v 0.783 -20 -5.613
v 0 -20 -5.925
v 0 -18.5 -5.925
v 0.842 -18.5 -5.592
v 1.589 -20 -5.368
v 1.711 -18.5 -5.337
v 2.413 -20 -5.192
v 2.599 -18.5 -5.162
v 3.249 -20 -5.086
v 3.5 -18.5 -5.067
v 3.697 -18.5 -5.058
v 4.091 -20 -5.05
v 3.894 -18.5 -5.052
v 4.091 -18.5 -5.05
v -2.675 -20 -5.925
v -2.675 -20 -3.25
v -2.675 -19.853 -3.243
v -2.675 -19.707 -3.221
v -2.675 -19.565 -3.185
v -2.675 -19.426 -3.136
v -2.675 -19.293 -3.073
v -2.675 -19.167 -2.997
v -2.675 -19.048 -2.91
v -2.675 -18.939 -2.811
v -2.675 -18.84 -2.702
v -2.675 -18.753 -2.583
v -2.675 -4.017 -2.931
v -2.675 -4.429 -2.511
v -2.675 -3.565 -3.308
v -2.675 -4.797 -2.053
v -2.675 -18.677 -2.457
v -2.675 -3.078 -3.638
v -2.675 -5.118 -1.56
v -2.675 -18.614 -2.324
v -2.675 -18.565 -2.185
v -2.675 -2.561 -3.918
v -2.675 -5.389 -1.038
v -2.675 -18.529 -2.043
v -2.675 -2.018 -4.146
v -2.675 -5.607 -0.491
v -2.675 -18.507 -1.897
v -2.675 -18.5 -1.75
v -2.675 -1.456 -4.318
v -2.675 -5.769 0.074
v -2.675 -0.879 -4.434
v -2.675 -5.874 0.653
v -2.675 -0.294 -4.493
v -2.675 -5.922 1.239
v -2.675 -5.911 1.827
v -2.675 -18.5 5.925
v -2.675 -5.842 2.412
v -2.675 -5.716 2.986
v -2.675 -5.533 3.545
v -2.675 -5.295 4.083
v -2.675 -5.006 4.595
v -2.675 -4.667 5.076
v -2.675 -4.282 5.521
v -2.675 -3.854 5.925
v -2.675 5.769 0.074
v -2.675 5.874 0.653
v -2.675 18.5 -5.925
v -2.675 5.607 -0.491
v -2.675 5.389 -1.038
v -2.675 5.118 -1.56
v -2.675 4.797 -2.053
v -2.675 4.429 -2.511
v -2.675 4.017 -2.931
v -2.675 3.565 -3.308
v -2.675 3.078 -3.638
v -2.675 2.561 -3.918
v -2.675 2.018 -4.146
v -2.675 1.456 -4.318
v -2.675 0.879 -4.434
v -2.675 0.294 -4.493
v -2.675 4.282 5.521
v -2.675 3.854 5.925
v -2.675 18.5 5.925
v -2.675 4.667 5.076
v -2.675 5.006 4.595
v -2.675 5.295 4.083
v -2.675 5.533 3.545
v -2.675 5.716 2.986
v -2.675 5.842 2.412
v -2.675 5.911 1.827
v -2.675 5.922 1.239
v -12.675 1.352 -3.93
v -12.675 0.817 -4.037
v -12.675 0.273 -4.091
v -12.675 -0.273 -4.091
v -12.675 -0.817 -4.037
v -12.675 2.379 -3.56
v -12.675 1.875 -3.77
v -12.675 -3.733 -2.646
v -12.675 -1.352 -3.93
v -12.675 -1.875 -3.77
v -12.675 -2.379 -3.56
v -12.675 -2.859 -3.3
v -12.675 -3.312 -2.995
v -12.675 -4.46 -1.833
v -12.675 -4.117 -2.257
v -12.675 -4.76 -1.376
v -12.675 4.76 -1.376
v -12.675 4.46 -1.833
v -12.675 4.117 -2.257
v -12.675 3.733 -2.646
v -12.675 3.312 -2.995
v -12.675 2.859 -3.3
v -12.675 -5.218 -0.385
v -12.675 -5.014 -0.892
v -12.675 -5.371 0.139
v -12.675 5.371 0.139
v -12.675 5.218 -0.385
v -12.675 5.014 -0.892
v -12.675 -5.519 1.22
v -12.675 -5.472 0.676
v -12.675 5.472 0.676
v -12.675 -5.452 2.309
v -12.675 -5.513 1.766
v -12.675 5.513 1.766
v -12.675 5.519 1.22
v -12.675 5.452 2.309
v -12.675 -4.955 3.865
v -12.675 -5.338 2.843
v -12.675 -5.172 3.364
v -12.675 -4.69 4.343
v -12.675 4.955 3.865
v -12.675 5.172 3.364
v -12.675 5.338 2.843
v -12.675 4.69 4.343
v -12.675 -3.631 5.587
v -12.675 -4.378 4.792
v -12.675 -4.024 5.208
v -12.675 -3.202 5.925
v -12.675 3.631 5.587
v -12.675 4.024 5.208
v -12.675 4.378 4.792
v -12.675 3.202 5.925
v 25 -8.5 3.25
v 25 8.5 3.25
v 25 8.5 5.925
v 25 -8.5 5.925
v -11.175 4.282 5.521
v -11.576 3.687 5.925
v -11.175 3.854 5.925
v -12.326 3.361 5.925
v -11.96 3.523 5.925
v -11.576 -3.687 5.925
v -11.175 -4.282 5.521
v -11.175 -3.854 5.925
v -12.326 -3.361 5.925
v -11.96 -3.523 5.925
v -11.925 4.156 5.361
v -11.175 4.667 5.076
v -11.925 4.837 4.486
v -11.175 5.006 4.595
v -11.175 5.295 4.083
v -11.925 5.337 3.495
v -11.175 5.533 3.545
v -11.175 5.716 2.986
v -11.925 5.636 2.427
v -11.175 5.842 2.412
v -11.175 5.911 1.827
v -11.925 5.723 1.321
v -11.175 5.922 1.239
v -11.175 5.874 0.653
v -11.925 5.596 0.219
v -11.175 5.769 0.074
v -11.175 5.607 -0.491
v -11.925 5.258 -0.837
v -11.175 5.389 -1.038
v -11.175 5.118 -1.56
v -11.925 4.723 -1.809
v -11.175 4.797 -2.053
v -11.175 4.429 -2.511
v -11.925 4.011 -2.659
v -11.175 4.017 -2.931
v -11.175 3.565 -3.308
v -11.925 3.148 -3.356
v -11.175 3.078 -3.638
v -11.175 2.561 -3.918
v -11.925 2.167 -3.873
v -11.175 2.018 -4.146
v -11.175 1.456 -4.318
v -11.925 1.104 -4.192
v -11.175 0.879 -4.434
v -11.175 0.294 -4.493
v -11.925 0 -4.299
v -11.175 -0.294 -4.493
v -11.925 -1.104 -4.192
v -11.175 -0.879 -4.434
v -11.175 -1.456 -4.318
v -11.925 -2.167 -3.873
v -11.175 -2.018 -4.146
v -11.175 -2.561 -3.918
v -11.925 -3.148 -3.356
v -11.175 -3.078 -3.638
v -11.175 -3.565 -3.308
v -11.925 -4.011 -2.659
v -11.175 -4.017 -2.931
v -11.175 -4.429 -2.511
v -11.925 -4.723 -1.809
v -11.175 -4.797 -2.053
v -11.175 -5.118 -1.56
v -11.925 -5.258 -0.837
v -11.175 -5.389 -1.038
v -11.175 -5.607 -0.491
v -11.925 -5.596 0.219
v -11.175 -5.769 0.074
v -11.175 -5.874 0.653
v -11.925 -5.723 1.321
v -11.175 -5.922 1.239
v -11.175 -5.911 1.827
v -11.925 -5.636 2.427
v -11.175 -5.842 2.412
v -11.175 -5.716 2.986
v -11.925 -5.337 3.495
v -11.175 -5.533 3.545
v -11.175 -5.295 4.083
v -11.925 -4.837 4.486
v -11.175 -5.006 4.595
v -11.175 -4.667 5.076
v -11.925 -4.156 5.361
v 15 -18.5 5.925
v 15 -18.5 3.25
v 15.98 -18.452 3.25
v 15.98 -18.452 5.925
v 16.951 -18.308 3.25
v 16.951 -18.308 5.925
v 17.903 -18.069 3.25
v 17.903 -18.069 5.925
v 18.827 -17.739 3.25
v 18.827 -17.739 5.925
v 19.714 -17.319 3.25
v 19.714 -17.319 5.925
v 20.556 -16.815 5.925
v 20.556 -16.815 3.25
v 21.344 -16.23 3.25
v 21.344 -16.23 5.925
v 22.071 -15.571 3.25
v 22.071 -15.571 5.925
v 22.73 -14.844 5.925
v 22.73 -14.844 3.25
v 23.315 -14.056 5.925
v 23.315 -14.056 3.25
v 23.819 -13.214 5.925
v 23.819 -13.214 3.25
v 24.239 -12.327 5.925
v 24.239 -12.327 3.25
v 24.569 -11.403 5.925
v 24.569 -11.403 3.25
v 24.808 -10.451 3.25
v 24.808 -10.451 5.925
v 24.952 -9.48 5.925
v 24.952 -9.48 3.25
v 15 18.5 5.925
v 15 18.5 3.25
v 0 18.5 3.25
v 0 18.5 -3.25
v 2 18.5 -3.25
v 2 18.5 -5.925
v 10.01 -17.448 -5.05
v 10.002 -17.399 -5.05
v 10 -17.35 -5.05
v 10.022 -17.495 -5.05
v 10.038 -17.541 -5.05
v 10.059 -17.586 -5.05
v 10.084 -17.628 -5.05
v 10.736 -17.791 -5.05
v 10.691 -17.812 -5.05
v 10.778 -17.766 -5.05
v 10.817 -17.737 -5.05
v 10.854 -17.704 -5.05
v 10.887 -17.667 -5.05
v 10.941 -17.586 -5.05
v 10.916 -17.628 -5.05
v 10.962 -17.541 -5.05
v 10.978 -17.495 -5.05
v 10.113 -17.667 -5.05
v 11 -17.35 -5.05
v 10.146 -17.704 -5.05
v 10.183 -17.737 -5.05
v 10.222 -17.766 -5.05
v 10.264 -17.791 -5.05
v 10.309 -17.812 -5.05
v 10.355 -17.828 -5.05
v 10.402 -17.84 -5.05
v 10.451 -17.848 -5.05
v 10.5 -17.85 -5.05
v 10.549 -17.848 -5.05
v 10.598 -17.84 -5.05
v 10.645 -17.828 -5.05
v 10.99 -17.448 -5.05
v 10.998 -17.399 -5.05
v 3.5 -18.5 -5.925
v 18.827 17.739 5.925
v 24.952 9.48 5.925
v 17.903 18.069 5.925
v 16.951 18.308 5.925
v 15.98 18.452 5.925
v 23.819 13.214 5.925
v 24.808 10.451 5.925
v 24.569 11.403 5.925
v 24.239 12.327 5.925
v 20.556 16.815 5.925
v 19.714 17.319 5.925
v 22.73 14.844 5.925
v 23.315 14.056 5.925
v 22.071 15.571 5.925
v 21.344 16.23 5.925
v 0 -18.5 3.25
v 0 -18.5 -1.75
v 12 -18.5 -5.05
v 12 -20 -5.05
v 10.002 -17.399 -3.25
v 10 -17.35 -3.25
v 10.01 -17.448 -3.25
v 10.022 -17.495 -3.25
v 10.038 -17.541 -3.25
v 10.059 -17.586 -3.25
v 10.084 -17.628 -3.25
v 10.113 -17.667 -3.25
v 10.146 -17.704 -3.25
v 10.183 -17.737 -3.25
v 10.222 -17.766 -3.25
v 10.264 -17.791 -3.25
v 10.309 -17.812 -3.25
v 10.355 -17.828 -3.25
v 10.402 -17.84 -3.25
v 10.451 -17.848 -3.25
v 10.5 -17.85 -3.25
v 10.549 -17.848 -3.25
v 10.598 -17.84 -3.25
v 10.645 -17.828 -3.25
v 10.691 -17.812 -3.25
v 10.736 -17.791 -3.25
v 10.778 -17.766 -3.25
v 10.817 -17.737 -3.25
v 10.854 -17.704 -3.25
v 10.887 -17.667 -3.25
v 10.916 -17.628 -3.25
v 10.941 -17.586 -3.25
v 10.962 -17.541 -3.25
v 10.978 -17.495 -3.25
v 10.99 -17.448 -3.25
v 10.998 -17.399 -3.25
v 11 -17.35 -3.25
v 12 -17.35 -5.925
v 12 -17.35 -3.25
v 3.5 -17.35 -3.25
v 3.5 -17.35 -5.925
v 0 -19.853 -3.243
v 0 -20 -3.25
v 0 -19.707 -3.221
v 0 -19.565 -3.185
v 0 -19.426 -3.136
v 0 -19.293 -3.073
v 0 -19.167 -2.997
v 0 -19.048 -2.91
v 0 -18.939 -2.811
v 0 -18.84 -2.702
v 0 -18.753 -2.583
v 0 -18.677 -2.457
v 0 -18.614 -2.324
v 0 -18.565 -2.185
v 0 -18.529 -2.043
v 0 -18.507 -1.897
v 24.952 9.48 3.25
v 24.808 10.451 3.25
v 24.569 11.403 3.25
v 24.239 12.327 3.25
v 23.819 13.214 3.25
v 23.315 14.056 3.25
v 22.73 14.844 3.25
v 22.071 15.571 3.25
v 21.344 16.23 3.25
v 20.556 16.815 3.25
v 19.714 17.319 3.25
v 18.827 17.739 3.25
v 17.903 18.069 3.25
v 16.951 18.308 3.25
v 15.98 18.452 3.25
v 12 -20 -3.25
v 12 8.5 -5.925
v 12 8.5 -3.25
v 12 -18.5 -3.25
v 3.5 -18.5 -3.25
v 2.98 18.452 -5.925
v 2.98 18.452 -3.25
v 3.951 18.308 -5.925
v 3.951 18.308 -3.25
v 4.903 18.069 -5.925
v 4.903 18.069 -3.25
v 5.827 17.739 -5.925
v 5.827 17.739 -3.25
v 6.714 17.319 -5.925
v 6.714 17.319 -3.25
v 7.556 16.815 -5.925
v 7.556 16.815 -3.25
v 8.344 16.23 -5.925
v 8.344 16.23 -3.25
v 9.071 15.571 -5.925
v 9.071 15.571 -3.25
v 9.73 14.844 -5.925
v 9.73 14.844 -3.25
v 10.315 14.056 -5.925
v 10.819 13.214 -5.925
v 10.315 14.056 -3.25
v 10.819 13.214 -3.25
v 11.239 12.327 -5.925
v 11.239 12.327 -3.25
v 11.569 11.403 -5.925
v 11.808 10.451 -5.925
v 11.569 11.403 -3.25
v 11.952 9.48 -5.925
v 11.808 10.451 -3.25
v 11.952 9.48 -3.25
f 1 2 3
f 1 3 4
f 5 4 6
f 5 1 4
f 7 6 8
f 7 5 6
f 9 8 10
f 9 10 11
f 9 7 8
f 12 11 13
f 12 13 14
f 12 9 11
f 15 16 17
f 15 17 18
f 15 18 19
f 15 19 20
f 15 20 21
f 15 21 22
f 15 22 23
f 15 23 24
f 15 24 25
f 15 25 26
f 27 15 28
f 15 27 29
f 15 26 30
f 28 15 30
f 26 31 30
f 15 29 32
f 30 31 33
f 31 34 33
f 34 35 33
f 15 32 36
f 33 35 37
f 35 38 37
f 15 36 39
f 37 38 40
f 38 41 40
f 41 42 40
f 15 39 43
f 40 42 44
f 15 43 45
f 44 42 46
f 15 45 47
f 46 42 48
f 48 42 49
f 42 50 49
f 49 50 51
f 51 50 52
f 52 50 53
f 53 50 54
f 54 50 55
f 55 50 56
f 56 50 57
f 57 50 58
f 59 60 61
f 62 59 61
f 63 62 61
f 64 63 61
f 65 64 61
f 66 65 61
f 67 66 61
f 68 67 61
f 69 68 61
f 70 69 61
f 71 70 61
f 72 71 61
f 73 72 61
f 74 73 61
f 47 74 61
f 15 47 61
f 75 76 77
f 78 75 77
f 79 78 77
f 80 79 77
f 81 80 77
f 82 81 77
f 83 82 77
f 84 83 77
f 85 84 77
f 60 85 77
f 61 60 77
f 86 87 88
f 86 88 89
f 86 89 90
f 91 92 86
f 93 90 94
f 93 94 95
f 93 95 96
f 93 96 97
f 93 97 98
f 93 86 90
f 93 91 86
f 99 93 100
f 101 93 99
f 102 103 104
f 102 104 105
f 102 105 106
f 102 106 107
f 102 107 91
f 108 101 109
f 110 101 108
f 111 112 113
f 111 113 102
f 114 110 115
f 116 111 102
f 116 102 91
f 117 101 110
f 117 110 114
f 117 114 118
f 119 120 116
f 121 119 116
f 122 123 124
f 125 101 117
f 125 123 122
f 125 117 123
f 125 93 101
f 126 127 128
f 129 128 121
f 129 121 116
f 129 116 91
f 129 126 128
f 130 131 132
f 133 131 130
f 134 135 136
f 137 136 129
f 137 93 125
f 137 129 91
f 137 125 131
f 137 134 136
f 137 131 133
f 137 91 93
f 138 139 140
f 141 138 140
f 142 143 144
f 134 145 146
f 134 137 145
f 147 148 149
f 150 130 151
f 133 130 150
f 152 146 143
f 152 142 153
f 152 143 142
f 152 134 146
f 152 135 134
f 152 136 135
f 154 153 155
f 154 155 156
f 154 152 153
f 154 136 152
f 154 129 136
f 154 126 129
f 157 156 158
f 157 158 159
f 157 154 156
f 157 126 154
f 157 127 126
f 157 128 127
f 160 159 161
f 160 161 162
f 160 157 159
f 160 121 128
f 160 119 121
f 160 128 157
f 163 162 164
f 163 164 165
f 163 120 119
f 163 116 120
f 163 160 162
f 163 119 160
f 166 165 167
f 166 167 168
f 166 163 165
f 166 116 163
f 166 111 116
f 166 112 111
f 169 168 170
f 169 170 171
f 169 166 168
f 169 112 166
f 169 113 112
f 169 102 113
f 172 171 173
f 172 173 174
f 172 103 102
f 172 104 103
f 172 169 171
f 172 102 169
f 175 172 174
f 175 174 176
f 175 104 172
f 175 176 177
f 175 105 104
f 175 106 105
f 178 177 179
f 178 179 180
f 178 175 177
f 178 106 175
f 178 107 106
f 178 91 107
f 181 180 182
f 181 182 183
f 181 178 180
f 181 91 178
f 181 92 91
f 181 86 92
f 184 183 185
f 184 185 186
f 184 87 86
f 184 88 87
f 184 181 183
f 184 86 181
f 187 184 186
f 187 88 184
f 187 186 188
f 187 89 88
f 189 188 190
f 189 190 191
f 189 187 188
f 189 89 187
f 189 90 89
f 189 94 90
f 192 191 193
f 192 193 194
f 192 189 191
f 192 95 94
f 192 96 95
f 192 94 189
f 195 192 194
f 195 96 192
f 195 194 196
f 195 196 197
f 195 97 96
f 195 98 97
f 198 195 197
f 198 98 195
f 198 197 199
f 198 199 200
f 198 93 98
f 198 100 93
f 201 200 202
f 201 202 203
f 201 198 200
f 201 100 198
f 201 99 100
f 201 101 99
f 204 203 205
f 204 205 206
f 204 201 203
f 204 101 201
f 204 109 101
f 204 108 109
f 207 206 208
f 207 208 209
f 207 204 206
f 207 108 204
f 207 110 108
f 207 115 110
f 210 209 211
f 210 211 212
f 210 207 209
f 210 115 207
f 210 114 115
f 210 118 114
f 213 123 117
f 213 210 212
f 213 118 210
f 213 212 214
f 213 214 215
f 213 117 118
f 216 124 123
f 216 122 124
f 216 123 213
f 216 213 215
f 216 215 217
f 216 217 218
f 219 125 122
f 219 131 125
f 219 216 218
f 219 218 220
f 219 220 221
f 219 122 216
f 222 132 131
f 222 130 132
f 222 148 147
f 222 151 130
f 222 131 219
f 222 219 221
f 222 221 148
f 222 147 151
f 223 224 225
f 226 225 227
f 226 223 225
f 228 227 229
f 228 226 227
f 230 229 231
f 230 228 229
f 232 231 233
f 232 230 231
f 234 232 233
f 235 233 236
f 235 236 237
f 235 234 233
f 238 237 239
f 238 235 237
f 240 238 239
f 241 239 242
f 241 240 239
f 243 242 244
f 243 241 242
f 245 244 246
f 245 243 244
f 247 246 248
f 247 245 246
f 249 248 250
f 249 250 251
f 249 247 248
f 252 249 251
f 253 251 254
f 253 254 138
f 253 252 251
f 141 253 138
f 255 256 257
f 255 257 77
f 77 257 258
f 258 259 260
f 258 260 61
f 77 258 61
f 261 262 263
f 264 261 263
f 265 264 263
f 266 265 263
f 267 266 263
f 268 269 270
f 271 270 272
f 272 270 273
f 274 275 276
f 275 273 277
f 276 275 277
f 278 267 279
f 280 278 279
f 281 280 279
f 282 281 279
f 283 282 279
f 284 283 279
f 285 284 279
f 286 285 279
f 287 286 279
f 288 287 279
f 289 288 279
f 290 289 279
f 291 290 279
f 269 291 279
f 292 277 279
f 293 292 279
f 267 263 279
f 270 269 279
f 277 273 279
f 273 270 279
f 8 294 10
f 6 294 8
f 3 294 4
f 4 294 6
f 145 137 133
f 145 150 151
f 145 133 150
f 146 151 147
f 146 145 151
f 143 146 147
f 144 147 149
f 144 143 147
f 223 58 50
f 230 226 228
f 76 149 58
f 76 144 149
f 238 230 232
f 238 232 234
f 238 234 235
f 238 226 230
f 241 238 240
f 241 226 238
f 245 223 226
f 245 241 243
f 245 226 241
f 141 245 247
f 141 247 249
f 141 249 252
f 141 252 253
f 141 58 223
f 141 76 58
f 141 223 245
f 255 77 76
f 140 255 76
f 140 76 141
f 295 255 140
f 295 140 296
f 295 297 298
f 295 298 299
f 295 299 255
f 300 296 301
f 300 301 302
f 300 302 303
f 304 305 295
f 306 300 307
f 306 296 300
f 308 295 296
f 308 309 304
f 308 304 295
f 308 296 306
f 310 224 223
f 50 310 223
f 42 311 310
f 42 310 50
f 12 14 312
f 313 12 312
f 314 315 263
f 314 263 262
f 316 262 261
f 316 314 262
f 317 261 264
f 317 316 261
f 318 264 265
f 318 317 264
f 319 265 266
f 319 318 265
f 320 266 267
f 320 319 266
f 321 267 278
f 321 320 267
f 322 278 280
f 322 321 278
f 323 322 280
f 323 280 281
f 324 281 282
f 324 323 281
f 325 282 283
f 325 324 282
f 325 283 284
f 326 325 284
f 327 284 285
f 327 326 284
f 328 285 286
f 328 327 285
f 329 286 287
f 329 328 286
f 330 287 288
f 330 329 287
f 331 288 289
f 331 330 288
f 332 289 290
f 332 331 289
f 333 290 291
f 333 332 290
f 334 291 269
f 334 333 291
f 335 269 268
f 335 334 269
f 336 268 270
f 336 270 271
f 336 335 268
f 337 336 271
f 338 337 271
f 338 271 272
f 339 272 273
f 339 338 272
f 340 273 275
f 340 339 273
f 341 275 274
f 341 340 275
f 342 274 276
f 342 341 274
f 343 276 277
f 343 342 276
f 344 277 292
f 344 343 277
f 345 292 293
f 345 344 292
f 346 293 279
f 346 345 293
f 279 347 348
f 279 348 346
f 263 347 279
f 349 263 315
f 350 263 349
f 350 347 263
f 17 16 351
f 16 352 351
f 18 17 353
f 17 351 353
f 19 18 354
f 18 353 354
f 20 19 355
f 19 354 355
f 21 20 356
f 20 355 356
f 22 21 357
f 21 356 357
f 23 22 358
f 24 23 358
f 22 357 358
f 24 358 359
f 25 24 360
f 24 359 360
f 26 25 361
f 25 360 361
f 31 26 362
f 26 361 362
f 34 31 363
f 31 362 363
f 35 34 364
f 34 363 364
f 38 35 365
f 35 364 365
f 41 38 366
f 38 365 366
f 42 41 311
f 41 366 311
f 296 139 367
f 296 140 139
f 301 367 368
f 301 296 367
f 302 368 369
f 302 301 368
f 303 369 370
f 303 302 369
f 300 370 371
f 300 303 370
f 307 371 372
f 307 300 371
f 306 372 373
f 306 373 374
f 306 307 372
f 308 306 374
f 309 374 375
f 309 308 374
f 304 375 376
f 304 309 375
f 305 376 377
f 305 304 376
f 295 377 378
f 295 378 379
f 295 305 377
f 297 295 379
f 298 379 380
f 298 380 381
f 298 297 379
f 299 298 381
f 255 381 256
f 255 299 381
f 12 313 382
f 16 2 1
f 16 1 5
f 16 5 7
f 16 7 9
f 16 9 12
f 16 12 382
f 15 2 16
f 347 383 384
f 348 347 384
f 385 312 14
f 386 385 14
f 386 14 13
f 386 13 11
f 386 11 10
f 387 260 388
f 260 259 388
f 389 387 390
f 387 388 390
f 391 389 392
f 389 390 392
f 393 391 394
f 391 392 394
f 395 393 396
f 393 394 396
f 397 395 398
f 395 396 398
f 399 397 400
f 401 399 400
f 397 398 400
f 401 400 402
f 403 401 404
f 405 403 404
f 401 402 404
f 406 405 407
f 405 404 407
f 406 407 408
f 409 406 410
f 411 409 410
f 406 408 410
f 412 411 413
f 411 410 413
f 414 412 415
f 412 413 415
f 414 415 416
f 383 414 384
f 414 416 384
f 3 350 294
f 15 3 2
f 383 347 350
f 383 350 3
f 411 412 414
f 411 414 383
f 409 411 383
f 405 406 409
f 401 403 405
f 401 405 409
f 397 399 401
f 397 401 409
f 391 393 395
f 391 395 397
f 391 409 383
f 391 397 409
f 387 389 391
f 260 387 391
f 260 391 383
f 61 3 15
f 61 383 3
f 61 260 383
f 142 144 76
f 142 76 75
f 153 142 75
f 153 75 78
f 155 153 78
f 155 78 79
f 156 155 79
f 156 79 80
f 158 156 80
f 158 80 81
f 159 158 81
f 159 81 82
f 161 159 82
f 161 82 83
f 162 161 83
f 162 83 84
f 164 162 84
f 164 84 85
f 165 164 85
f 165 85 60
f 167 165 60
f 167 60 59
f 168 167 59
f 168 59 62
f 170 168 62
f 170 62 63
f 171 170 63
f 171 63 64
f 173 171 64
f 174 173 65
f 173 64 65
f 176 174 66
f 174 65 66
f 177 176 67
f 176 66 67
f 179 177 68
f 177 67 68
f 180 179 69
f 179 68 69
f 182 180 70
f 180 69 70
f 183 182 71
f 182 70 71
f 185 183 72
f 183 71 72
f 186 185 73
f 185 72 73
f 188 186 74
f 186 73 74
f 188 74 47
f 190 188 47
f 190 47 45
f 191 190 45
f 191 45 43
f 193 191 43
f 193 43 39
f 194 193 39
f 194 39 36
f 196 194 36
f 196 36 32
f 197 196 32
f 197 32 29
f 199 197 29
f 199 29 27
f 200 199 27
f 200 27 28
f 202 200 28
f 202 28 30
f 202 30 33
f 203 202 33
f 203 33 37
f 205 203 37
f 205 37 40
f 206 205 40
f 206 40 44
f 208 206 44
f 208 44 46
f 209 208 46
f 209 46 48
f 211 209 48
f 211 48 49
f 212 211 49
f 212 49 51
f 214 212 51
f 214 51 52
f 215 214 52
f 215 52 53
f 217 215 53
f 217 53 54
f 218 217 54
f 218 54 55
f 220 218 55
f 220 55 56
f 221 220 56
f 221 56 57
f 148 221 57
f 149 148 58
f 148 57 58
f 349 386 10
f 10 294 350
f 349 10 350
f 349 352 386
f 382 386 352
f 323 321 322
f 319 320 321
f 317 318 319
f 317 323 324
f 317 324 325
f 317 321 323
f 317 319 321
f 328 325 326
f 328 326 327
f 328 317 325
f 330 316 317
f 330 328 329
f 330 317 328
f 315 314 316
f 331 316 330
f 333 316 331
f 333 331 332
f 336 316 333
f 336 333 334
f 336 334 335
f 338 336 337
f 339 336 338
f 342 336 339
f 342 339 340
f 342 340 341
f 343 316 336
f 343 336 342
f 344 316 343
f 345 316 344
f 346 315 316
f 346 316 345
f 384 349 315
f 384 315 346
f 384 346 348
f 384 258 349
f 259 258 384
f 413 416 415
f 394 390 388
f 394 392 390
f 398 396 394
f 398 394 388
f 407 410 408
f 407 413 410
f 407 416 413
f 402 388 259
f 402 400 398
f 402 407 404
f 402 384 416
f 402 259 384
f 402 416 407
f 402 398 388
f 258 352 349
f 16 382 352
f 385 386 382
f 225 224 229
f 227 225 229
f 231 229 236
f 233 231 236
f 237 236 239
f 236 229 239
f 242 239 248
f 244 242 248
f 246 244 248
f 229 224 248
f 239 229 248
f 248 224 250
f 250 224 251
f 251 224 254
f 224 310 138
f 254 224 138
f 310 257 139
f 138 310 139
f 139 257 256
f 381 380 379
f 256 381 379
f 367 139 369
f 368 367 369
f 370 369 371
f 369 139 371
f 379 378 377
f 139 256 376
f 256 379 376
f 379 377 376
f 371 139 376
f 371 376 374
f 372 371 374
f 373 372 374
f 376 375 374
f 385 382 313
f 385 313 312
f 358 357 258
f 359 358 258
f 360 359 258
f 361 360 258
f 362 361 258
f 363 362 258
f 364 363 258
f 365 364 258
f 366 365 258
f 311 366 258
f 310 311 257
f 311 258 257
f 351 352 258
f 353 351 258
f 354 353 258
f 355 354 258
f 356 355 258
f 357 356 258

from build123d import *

# Parameters (mm, degrees)
BOSS_EXTRUDE1_DEPTH = 18.5
SKETCH3_R           = 5.925
BOSS_EXTRUDE2_DEPTH = 10
SKETCH5_W           = 13.896314966
SKETCH5_H           = 3.370486285
CUT_EXTRUDE2_DEPTH  = 46.255082587
CHAMFER1_SIZE       = 1.5
CHAMFER1_SIZE2      = 0.401923789
CUT_EXTRUDE4_REACH  = 35.282
SKETCH7_W           = 8.5
SKETCH7_H           = 1.15
SKETCH9_W           = 14.675
SKETCH9_H           = 1.5
BOSS_EXTRUDE5_DEPTH = 1.8
FILLET8_R           = 1.5
SKETCH10_W          = 2.675
SKETCH10_H          = 1.5
BOSS_EXTRUDE6_DEPTH = 0.875
FILLET9_R           = 10
FILLET10_R          = 10


# Some blends are built 0.0001 mm under size
with BuildPart() as part:
    # Sketch2 → Boss-Extrude1 (new, symmetric)
    with BuildSketch(Plane(origin=(0, 0, 0), x_dir=(1, 0, 0), z_dir=(0, 1, 0))):
        Polygon((12, 3.25), (0, 3.25), (0, -3.25), (25, -3.25), (25, -5.925), (-2.675, -5.925), (-2.675, 5.925), (12, 5.925), align=None)
    extrude(amount=BOSS_EXTRUDE1_DEPTH, both=True)

    # Sketch3 → Boss-Extrude2 (add)
    with BuildSketch(Plane.ZY.offset(2.675)):
        with Locations(Location((1.425, 0, 0), (0, 0, 319.419581344))):
            Circle(SKETCH3_R)
    extrude(amount=BOSS_EXTRUDE2_DEPTH)

    # Sketch5 → Cut-Extrude2 (cut, through all)
    with BuildSketch(Plane(origin=(0, 18.5, 0), x_dir=(1, 0, 0), z_dir=(0, 1, 0))):
        with Locations((-9.623157483, -7.610243143)):
            Rectangle(SKETCH5_W, SKETCH5_H)
    extrude(amount=-CUT_EXTRUDE2_DEPTH, mode=Mode.SUBTRACT)

    # Chamfer1
    chamfer1_edges = [part.edges().sort_by_distance(p)[0] for p in [
        (-12.675, 0, -4.5),
    ]]
    chamfer1_side = [part.faces().sort_by_distance(p)[0] for p in [
        (-7.675, 0, -4.5),
    ]]
    chamfer(chamfer1_edges, length=CHAMFER1_SIZE, length2=CHAMFER1_SIZE2, reference=chamfer1_side[0])

    # Sketch7 → Cut-Extrude4 (cut, up to next)
    with BuildSketch(Plane(origin=(0, 0, -5.925), x_dir=(-1, 0, 0), z_dir=(0, 0, -1)), mode=Mode.PRIVATE) as cut_extrude4_sk1:
        with Locations((-7.75, -17.925)):
            Rectangle(SKETCH7_W, SKETCH7_H)
    cut_extrude4_tool1 = extrude(cut_extrude4_sk1.sketch, amount=-CUT_EXTRUDE4_REACH, mode=Mode.PRIVATE) & part.part
    add(cut_extrude4_tool1.solids().sort_by_distance((7.75, -17.925, -5.925))[0], mode=Mode.SUBTRACT)

    # Sketch9 → Boss-Extrude5 (add)
    with BuildSketch(Plane.XY.offset(-3.25)):
        with Locations((4.6625, -19.25)):
            Rectangle(SKETCH9_W, SKETCH9_H)
        with BuildLine():
            Line((11, -17.35), (10, -17.35))
            ThreePointArc((10, -17.35), (10.5, -17.85), (11, -17.35))
        make_face()
    extrude(amount=-BOSS_EXTRUDE5_DEPTH)

    # Fillet8
    fillet8_edges = [part.edges().sort_by_distance(p)[0] for p in [
        (-1.3375, -18.5, -3.25),
    ]]
    fillet(fillet8_edges, radius=FILLET8_R - 0.0001)  # a hair under: the kernel refuses the full size

    # Sketch10 → Boss-Extrude6 (add)
    with BuildSketch(Plane(origin=(0, 0, -5.05), x_dir=(-1, 0, 0), z_dir=(0, 0, -1))):
        with Locations((1.3375, -19.25)):
            Rectangle(SKETCH10_W, SKETCH10_H)
    extrude(amount=BOSS_EXTRUDE6_DEPTH)

    # Fillet9
    # the kernel refuses this fillet: 10 mm, written as the material it adds along each edge
    with BuildSketch(Plane(origin=(0, -20, -5.05), x_dir=(1, 0, 0), z_dir=(0, 1, 0))) as fillet9_piece_1:
        with BuildLine():
            CenterArc((4.090767043, 10), FILLET9_R, 245.853152003, 24.146847997)
            Line((0, 0.875), (0, 0))
            Line((0, 0), (4.090767043, 0))
        make_face()
    extrude(amount=1.5)

    # Fillet10
    fillet10_edges = [part.edges().sort_by_distance(p)[0] for p in [
        (25, 18.5, 4.5875),
        (12, 18.5, -4.5875),
        (25, -18.5, 4.5875),
    ]]
    fillet(fillet10_edges, radius=FILLET10_R)


solid = part.part
